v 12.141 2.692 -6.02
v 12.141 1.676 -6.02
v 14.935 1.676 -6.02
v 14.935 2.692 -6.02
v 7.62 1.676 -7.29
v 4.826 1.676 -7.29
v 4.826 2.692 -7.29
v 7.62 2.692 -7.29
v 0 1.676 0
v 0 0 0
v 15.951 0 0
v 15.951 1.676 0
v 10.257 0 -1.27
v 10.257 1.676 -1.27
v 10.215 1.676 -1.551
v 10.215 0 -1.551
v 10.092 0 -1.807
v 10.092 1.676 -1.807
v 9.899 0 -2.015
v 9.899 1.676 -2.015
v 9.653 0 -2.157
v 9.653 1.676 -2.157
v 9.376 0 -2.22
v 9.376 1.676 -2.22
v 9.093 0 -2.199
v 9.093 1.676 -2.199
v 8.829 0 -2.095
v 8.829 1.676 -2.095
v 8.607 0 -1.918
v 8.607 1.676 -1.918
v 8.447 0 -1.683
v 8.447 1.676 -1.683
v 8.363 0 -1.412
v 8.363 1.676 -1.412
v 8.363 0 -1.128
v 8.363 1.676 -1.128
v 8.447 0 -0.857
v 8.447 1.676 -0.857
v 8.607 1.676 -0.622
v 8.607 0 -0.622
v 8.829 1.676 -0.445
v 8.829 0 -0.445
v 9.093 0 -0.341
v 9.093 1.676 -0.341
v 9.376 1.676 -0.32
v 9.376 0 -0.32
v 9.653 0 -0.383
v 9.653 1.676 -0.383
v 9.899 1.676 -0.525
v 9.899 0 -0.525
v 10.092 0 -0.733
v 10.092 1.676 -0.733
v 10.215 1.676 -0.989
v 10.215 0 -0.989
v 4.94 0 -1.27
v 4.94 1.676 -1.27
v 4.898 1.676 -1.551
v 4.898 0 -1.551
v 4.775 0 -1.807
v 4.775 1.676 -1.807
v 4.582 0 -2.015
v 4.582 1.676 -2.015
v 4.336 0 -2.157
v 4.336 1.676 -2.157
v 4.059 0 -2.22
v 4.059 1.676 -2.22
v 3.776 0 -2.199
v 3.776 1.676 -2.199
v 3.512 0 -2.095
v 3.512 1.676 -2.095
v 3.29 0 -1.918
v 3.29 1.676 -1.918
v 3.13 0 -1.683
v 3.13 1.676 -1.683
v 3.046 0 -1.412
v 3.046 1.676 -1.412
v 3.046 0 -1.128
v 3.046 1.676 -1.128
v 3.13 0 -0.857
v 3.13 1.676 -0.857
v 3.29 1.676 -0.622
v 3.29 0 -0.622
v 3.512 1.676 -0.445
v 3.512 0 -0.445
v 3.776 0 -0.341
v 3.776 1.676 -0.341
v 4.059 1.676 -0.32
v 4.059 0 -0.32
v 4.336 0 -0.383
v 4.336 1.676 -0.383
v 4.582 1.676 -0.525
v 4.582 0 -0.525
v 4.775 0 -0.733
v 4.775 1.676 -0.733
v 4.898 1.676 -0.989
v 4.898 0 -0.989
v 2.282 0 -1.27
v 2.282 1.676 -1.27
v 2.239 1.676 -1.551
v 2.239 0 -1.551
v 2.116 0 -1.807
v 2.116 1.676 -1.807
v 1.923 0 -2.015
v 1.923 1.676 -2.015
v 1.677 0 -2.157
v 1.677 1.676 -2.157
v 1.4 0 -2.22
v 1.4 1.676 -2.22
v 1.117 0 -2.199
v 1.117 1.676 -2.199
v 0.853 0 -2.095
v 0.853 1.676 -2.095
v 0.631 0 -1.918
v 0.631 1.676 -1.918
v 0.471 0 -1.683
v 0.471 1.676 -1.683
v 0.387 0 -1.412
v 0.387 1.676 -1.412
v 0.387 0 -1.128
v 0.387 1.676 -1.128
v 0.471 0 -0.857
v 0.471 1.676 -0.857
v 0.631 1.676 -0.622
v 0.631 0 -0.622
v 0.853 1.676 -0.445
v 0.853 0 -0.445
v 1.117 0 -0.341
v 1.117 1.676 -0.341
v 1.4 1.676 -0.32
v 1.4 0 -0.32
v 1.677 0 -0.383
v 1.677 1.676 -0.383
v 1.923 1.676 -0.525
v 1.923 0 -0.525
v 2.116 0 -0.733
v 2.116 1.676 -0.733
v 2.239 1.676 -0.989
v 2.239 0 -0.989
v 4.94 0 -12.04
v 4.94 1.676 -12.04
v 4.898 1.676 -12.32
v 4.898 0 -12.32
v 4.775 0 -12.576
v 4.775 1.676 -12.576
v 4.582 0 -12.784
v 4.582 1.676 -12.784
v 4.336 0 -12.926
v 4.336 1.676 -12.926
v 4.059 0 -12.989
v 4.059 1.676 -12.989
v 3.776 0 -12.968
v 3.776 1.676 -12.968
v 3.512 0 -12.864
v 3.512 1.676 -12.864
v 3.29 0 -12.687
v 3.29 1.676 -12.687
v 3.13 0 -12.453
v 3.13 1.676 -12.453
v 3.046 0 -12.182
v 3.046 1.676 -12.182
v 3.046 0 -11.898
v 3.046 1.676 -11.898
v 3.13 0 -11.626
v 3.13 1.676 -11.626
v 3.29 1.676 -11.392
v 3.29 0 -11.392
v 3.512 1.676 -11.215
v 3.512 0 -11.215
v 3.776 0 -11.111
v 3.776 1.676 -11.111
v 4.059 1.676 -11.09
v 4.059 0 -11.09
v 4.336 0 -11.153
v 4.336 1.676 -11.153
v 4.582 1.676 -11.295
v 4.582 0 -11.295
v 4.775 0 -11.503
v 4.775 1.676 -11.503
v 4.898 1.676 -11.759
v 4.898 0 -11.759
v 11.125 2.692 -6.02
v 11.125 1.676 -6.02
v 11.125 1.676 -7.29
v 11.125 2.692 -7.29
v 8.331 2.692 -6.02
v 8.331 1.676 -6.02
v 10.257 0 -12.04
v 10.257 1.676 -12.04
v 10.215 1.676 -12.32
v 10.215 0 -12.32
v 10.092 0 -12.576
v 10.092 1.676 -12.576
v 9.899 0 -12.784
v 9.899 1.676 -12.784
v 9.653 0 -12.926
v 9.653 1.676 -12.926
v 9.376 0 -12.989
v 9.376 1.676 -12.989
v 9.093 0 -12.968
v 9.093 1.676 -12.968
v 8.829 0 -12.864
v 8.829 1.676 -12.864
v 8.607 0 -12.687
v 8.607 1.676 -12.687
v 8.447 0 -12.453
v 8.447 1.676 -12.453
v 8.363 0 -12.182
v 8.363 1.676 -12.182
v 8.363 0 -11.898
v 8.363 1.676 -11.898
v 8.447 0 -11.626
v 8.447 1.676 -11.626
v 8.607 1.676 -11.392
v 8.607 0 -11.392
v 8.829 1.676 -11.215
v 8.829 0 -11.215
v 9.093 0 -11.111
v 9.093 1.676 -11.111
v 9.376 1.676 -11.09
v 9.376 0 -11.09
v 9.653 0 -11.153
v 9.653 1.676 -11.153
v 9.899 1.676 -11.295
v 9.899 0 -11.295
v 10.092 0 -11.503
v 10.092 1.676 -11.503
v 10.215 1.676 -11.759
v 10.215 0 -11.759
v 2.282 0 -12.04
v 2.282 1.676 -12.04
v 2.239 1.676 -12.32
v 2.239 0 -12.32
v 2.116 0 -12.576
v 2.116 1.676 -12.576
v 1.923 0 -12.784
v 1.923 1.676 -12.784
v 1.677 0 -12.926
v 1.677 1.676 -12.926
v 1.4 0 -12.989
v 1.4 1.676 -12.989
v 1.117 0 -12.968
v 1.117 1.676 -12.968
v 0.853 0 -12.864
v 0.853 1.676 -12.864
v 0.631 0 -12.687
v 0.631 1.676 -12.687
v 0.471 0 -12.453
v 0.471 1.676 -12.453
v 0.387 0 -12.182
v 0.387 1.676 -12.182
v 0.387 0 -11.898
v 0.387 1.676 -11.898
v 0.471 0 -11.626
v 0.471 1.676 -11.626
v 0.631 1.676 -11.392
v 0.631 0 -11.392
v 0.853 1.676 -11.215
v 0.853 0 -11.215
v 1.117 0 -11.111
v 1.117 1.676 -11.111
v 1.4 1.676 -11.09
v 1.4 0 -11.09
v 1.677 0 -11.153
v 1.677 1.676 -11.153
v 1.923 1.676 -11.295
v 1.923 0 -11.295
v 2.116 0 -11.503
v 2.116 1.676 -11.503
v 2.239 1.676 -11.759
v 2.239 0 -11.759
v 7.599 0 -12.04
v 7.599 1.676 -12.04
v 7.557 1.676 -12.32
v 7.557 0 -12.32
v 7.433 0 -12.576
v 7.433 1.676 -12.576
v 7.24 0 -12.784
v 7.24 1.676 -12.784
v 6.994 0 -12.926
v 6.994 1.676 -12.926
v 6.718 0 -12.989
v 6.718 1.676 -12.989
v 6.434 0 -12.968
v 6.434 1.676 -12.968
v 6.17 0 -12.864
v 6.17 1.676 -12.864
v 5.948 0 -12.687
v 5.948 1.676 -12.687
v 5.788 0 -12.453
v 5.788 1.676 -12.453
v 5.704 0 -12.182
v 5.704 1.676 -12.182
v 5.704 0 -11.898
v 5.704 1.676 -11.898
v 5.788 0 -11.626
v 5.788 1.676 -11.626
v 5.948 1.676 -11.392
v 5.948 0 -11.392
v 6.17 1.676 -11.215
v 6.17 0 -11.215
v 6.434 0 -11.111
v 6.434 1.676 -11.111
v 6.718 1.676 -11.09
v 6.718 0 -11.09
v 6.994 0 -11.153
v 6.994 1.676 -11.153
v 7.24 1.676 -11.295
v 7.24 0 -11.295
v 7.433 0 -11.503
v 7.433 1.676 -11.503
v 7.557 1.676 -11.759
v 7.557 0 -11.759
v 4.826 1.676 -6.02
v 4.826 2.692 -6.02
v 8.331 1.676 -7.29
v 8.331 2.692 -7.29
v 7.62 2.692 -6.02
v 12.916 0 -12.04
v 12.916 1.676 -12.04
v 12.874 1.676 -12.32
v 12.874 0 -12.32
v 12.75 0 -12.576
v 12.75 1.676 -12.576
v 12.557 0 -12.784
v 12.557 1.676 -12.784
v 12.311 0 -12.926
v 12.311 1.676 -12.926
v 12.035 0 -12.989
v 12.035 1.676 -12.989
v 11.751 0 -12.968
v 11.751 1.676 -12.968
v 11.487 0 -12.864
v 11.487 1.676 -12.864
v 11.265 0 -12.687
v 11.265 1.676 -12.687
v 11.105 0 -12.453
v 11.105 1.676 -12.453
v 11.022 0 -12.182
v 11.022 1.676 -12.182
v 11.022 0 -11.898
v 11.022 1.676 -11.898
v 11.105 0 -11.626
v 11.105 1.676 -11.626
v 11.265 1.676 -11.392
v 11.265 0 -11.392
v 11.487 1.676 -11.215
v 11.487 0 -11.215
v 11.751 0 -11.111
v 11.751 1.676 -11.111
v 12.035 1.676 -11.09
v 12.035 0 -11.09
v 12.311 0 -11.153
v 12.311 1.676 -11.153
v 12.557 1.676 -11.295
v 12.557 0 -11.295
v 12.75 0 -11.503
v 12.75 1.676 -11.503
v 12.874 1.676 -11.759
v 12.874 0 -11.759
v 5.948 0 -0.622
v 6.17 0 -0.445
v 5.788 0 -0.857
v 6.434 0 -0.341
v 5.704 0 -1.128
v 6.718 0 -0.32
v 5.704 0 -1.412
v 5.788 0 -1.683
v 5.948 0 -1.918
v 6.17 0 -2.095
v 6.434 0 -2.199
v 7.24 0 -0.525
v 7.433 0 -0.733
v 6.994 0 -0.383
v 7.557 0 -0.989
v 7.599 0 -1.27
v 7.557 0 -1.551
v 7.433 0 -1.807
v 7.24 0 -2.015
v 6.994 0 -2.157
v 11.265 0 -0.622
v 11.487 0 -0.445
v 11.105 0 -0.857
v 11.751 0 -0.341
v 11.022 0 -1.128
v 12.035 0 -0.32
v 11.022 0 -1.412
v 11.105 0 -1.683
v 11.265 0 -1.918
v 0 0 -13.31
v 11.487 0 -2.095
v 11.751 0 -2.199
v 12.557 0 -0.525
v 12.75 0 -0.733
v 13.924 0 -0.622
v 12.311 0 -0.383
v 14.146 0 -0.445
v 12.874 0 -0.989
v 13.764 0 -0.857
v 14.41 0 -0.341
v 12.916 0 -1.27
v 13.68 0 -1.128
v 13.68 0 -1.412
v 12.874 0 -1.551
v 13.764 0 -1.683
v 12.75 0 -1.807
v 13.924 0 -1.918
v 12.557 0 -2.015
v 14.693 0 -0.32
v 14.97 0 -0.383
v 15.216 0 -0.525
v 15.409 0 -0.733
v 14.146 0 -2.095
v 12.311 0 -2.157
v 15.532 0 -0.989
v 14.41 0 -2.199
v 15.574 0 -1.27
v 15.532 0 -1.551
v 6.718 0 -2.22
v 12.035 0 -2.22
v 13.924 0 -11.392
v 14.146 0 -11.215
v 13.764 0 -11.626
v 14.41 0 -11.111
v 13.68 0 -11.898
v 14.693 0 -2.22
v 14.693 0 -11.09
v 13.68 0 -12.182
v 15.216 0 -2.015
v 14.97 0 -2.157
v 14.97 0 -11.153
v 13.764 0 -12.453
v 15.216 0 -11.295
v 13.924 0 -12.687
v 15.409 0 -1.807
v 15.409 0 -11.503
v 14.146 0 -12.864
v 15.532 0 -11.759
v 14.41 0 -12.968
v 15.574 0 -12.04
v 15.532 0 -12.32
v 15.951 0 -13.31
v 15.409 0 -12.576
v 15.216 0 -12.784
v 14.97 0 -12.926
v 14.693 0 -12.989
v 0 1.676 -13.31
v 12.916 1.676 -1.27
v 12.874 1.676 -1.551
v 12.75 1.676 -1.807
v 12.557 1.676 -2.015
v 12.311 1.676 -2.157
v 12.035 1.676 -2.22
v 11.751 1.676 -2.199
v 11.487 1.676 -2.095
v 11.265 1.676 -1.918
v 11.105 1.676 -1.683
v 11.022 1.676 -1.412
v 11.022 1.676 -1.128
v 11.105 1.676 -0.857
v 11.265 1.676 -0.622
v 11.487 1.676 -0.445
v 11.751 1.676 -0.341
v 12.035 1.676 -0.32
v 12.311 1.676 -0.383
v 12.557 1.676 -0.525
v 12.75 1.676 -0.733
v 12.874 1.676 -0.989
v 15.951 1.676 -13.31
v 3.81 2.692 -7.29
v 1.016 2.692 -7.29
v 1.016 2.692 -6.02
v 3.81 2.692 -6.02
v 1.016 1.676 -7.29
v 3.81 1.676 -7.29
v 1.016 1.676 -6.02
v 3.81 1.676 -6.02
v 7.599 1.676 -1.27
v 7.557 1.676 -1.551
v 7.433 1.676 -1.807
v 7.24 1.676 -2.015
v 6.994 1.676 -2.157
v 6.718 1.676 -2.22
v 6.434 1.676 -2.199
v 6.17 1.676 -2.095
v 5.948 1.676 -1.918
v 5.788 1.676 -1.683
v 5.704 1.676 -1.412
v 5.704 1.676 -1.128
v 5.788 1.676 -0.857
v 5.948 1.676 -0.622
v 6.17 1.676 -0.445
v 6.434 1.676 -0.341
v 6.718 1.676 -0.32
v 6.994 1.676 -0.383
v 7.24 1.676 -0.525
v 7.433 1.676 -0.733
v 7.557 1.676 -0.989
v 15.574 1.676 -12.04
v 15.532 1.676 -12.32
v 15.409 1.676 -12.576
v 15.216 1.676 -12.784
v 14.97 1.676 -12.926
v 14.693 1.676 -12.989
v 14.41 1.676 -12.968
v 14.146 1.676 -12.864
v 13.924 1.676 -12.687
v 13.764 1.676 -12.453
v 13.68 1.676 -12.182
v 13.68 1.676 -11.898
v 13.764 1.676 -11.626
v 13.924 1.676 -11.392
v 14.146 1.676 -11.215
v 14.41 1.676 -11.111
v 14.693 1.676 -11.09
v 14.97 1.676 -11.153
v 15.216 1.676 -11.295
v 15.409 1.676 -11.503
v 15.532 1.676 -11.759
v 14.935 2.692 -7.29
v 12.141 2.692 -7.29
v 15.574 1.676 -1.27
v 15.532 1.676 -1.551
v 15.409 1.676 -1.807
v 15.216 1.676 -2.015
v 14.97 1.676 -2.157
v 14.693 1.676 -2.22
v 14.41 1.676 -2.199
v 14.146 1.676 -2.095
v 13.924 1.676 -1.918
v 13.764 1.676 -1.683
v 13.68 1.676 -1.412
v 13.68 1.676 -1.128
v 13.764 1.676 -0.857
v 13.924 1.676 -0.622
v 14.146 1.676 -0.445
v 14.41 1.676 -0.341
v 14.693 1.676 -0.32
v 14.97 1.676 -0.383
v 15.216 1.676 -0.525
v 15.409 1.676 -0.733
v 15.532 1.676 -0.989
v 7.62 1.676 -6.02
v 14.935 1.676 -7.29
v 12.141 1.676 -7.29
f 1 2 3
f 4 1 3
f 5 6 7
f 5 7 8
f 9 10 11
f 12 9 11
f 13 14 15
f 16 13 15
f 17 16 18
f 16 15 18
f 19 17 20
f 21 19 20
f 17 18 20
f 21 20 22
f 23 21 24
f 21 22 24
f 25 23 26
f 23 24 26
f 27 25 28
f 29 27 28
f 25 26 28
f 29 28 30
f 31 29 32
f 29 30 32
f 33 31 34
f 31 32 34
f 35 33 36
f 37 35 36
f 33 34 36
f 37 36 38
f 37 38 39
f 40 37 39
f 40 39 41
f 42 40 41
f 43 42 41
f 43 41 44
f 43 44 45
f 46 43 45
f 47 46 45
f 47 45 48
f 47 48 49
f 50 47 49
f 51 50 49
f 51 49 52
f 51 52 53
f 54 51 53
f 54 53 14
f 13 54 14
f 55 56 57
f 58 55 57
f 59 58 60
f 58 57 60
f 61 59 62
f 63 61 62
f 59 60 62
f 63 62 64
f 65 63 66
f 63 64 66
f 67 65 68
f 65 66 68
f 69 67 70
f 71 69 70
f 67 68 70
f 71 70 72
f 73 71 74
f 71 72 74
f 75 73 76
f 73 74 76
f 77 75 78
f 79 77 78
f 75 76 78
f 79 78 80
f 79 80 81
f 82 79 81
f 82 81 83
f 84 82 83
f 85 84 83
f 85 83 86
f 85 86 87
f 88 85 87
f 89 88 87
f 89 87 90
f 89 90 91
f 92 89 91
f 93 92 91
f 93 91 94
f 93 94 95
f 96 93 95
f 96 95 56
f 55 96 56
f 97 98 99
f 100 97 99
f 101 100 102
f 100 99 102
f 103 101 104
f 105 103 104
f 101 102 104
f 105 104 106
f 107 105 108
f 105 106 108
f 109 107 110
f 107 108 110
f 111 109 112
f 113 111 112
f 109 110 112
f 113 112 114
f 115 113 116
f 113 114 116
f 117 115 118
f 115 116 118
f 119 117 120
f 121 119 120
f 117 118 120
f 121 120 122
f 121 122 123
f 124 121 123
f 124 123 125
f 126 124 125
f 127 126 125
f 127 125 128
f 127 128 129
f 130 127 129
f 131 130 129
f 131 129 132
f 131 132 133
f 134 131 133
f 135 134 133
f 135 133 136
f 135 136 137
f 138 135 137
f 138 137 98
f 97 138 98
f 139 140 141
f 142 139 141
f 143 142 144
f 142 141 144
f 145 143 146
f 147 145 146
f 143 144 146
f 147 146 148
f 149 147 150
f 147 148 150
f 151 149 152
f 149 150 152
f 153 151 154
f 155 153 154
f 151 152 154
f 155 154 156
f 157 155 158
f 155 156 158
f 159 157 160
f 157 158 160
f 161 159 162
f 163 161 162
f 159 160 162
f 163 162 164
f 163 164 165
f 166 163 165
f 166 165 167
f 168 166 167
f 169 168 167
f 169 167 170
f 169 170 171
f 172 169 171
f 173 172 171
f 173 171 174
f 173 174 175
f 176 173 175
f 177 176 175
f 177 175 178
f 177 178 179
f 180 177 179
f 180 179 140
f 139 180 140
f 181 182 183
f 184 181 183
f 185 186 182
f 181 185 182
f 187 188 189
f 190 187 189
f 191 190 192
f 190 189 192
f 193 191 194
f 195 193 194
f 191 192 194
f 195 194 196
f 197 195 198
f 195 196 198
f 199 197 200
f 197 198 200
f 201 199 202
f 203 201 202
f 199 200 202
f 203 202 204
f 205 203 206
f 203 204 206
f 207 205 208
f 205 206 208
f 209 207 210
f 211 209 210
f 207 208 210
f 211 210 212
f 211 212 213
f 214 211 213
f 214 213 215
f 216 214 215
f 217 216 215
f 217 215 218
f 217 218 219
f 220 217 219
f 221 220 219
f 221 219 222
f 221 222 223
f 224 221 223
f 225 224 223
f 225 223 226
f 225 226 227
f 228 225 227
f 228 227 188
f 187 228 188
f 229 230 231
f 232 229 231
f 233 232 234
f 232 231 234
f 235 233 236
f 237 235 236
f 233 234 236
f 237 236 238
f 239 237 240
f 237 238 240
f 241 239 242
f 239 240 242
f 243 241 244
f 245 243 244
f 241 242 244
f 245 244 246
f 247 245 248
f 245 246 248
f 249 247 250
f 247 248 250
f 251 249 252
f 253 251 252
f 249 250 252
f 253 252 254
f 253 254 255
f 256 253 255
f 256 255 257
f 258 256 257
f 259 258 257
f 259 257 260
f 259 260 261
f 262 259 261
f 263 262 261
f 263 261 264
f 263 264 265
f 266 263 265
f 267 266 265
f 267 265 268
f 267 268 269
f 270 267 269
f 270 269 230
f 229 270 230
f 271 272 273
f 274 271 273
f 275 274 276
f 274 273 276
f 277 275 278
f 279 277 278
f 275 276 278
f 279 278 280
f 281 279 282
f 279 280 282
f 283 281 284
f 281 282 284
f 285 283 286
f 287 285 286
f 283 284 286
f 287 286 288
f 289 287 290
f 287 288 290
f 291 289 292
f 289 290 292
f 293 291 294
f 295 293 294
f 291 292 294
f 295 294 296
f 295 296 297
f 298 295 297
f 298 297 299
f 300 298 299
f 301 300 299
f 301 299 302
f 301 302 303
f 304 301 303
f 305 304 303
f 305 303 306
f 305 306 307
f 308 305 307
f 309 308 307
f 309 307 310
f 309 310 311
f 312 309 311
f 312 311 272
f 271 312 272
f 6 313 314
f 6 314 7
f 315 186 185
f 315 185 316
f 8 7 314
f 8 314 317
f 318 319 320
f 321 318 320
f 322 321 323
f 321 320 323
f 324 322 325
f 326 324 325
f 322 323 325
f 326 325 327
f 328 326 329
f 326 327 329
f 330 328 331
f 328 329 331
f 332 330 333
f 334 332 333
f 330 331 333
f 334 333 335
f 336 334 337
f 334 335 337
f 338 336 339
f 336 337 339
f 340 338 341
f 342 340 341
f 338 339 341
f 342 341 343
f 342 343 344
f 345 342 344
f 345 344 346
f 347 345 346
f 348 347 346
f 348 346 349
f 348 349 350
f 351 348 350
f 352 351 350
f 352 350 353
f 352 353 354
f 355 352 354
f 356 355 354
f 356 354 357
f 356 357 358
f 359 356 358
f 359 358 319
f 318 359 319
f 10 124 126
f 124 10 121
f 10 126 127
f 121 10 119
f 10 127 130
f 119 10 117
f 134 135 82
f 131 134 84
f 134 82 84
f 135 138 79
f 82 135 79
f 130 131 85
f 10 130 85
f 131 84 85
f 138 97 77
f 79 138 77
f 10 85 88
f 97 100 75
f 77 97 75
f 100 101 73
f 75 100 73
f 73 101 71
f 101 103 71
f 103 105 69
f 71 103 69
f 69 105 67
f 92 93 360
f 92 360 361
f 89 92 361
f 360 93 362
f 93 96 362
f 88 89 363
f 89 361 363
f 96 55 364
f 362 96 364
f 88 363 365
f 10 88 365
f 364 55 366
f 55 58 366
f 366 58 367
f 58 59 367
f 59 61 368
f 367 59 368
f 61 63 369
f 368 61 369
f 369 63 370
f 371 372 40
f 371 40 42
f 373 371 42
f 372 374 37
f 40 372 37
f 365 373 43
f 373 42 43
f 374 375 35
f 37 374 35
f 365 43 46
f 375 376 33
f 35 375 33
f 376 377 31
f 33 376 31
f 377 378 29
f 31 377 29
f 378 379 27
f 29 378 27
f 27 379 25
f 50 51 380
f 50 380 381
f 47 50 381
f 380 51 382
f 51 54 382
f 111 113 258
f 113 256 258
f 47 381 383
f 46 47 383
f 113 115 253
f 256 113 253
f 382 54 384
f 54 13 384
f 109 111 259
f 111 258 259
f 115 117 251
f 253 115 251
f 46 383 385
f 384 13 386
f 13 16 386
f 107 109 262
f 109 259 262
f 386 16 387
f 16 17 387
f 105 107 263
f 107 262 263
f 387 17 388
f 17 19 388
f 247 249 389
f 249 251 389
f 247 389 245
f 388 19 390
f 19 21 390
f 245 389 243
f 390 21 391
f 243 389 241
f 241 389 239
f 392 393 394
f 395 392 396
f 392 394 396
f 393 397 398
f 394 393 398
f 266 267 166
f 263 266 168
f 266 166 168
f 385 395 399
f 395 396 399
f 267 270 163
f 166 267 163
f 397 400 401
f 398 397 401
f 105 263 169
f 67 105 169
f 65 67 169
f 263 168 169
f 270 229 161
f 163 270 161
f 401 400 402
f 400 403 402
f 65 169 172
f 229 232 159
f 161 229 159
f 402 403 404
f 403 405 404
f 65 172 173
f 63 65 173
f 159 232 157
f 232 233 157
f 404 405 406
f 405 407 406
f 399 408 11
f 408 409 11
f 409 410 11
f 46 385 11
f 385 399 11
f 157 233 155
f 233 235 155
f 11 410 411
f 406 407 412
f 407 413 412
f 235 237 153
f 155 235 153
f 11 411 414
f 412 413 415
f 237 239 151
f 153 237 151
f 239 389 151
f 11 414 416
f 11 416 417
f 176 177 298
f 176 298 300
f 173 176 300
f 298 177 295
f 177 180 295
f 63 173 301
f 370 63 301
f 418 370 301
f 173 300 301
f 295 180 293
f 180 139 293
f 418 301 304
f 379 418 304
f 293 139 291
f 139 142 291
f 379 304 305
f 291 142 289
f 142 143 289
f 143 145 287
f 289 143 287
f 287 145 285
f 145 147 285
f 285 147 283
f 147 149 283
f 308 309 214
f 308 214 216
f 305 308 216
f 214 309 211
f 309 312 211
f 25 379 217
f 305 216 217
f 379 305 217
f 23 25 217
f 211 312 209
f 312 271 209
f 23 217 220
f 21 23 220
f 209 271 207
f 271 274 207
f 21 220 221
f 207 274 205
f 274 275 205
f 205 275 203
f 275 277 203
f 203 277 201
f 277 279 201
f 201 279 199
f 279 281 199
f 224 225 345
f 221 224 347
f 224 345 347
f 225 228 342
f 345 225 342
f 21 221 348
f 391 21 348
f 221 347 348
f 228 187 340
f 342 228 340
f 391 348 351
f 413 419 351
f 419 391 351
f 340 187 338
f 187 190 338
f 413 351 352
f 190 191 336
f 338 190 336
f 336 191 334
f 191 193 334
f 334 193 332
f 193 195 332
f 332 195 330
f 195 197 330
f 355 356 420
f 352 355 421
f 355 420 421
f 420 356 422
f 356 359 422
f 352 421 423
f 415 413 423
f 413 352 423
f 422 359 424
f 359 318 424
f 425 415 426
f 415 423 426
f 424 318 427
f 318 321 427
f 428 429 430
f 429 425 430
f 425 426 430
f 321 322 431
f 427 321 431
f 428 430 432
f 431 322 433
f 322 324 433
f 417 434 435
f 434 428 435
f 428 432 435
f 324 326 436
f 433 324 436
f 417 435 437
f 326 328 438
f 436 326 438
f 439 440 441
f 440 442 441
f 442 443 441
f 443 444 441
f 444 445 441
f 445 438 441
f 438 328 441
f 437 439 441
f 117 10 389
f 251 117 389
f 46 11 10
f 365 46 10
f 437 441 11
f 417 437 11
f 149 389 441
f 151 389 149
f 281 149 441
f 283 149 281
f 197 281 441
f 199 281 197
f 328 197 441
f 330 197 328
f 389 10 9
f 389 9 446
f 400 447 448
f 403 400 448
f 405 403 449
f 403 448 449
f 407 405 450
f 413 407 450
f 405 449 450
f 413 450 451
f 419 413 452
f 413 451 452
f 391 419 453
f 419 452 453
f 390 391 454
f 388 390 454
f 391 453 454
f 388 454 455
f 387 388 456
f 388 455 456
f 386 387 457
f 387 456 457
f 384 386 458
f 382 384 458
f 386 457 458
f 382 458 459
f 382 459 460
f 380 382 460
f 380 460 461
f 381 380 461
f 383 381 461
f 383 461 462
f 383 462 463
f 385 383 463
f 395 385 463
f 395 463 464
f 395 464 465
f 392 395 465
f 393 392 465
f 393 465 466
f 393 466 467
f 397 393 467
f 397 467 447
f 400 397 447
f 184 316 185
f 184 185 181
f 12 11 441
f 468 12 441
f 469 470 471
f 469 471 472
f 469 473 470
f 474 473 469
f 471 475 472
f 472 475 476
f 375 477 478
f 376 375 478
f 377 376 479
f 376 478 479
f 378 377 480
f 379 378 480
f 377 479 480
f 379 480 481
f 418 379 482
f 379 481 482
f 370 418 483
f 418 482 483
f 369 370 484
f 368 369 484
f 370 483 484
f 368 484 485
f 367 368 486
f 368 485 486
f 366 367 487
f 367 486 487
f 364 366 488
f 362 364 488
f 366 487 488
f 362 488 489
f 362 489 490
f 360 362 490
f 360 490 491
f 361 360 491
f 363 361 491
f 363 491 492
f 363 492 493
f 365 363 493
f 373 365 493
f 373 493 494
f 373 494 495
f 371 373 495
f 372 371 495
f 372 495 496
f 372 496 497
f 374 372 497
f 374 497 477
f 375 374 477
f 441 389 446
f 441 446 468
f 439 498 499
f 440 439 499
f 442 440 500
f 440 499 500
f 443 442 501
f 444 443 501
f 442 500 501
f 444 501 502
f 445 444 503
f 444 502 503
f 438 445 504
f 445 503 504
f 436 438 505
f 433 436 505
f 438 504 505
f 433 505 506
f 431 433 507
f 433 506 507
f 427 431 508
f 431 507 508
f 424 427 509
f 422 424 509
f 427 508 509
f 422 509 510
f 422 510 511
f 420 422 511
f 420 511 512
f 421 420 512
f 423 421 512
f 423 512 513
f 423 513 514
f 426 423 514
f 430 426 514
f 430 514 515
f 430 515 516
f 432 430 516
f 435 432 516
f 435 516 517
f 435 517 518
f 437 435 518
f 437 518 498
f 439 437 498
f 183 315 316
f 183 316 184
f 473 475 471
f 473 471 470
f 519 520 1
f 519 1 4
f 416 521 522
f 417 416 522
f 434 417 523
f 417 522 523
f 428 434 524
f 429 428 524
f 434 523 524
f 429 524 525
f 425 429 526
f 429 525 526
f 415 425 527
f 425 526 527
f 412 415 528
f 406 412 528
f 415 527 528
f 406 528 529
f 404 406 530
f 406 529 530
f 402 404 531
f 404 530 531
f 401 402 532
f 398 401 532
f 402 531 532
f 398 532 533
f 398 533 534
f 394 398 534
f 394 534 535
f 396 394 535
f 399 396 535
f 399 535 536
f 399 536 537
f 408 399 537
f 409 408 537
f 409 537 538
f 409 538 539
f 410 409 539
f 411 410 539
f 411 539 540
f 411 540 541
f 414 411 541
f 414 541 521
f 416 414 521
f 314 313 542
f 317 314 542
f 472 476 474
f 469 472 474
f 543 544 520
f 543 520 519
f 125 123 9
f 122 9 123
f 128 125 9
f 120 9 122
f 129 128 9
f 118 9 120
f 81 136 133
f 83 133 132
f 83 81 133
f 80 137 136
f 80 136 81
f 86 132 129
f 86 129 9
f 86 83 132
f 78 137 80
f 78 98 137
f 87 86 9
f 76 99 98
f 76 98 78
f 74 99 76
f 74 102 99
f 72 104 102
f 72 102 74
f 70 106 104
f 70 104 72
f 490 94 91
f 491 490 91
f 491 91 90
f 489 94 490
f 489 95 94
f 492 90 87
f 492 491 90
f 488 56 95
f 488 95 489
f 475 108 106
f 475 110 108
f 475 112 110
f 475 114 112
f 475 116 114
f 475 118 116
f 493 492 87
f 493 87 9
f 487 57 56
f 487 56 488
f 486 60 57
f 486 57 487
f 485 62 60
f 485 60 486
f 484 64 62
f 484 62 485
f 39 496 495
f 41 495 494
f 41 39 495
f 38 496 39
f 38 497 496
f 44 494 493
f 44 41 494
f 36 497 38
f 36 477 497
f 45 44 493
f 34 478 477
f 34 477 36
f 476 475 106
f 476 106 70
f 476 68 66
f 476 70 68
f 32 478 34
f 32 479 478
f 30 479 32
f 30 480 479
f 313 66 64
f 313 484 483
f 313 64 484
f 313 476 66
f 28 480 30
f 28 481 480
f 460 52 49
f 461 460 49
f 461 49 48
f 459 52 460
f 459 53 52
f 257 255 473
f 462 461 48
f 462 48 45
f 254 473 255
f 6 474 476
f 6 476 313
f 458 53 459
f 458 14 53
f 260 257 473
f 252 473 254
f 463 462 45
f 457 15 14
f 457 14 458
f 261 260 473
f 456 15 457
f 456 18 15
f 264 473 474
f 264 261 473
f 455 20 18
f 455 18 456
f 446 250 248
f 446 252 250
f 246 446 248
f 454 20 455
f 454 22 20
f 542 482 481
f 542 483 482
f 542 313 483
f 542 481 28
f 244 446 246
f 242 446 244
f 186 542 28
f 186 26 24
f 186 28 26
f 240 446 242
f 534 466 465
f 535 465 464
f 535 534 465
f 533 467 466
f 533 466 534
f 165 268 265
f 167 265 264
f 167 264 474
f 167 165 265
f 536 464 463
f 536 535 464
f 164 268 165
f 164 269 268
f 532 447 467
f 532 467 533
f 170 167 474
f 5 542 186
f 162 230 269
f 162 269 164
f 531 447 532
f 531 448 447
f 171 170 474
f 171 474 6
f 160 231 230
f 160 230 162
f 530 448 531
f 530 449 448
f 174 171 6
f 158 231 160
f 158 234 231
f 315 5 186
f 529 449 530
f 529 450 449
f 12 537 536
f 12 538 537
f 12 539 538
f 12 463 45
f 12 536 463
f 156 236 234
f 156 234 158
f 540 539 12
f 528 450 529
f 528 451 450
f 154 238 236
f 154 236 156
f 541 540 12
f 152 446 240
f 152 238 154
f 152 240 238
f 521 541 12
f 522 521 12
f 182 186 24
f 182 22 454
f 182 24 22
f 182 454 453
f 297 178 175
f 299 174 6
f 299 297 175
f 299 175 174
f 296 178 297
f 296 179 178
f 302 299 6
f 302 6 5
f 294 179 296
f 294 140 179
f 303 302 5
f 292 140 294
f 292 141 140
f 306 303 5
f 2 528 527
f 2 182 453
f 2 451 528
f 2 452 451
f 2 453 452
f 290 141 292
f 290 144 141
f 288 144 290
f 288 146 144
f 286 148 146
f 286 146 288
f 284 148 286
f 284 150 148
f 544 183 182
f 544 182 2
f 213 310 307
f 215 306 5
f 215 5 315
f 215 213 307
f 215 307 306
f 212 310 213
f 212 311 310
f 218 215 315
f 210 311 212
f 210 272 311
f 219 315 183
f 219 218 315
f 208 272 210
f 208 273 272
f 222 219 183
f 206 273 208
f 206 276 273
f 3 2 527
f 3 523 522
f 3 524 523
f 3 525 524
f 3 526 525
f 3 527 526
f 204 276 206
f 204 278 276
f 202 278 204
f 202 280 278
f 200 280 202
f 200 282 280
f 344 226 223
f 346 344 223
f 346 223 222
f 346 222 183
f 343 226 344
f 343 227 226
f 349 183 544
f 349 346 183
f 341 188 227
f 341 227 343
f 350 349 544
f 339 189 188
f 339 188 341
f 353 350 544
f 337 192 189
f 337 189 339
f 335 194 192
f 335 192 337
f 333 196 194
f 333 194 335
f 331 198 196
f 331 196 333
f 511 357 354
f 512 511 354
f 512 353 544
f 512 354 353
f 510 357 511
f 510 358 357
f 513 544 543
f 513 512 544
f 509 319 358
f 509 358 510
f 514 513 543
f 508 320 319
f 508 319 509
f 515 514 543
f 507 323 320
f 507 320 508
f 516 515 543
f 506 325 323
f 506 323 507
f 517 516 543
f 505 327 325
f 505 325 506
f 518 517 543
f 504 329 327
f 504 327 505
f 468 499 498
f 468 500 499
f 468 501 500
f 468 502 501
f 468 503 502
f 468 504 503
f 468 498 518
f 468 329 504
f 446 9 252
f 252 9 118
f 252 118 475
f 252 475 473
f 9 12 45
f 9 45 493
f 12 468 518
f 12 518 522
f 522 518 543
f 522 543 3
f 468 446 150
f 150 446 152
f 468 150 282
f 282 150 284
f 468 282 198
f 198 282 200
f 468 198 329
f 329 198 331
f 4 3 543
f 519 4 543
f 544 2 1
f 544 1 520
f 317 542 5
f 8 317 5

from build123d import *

# Parameters (mm, degrees)
SKETCH1_W           = 15.9512
SKETCH1_H           = 13.3096
BOSS_EXTRUDE1_DEPTH = 1.6764
SKETCH2_W           = 2.794
SKETCH2_H           = 1.27
BOSS_EXTRUDE2_DEPTH = 1.016
SKETCH3_R           = 0.9525
CUT_EXTRUDE1_DEPTH  = 2.6764


with BuildPart() as part:
    # Sketch1 → Boss-Extrude1 (new body)
    with BuildSketch(Plane(origin=(0, 0, 0), x_dir=(1, 0, 0), z_dir=(0, 1, 0))):
        with Locations((7.9756, 6.6548)):
            Rectangle(SKETCH1_W, SKETCH1_H)
    extrude(amount=BOSS_EXTRUDE1_DEPTH)

    # Sketch2 → Boss-Extrude2 (add)
    with BuildSketch(Plane(origin=(0, 1.6764, 0), x_dir=(1, 0, 0), z_dir=(0, 1, 0))):
        with Locations((2.413, 6.6548)):
            Rectangle(SKETCH2_W, SKETCH2_H)
        with Locations((6.223, 6.6548)):
            Rectangle(SKETCH2_W, SKETCH2_H)
        with Locations((9.7282, 6.6548)):
            Rectangle(SKETCH2_W, SKETCH2_H)
        with Locations((13.5382, 6.6548)):
            Rectangle(SKETCH2_W, SKETCH2_H)
    extrude(amount=BOSS_EXTRUDE2_DEPTH)

    # Sketch3 → Cut-Extrude1 (cut, through all)
    with BuildSketch(Plane(origin=(0, 1.6764, 0), x_dir=(1, 0, 0), z_dir=(0, 1, 0))):
        with Locations((1.329266667, 12.0396)):
            Circle(SKETCH3_R)
        with Locations((3.987808467, 12.0396)):
            Circle(SKETCH3_R)
        with Locations((6.646350267, 12.0396)):
            Circle(SKETCH3_R)
        with Locations((9.304892067, 12.0396)):
            Circle(SKETCH3_R)
        with Locations((11.963433867, 12.0396)):
            Circle(SKETCH3_R)
        with Locations((14.621975667, 12.0396)):
            Circle(SKETCH3_R)
        with Locations((14.621975667, 1.27)):
            Circle(SKETCH3_R)
        with Locations((11.963433867, 1.27)):
            Circle(SKETCH3_R)
        with Locations((9.304892067, 1.27)):
            Circle(SKETCH3_R)
        with Locations((6.646350267, 1.27)):
            Circle(SKETCH3_R)
        with Locations((3.987808467, 1.27)):
            Circle(SKETCH3_R)
        with Locations((1.329266667, 1.27)):
            Circle(SKETCH3_R)
    extrude(amount=-CUT_EXTRUDE1_DEPTH, mode=Mode.SUBTRACT)


solid = part.part
